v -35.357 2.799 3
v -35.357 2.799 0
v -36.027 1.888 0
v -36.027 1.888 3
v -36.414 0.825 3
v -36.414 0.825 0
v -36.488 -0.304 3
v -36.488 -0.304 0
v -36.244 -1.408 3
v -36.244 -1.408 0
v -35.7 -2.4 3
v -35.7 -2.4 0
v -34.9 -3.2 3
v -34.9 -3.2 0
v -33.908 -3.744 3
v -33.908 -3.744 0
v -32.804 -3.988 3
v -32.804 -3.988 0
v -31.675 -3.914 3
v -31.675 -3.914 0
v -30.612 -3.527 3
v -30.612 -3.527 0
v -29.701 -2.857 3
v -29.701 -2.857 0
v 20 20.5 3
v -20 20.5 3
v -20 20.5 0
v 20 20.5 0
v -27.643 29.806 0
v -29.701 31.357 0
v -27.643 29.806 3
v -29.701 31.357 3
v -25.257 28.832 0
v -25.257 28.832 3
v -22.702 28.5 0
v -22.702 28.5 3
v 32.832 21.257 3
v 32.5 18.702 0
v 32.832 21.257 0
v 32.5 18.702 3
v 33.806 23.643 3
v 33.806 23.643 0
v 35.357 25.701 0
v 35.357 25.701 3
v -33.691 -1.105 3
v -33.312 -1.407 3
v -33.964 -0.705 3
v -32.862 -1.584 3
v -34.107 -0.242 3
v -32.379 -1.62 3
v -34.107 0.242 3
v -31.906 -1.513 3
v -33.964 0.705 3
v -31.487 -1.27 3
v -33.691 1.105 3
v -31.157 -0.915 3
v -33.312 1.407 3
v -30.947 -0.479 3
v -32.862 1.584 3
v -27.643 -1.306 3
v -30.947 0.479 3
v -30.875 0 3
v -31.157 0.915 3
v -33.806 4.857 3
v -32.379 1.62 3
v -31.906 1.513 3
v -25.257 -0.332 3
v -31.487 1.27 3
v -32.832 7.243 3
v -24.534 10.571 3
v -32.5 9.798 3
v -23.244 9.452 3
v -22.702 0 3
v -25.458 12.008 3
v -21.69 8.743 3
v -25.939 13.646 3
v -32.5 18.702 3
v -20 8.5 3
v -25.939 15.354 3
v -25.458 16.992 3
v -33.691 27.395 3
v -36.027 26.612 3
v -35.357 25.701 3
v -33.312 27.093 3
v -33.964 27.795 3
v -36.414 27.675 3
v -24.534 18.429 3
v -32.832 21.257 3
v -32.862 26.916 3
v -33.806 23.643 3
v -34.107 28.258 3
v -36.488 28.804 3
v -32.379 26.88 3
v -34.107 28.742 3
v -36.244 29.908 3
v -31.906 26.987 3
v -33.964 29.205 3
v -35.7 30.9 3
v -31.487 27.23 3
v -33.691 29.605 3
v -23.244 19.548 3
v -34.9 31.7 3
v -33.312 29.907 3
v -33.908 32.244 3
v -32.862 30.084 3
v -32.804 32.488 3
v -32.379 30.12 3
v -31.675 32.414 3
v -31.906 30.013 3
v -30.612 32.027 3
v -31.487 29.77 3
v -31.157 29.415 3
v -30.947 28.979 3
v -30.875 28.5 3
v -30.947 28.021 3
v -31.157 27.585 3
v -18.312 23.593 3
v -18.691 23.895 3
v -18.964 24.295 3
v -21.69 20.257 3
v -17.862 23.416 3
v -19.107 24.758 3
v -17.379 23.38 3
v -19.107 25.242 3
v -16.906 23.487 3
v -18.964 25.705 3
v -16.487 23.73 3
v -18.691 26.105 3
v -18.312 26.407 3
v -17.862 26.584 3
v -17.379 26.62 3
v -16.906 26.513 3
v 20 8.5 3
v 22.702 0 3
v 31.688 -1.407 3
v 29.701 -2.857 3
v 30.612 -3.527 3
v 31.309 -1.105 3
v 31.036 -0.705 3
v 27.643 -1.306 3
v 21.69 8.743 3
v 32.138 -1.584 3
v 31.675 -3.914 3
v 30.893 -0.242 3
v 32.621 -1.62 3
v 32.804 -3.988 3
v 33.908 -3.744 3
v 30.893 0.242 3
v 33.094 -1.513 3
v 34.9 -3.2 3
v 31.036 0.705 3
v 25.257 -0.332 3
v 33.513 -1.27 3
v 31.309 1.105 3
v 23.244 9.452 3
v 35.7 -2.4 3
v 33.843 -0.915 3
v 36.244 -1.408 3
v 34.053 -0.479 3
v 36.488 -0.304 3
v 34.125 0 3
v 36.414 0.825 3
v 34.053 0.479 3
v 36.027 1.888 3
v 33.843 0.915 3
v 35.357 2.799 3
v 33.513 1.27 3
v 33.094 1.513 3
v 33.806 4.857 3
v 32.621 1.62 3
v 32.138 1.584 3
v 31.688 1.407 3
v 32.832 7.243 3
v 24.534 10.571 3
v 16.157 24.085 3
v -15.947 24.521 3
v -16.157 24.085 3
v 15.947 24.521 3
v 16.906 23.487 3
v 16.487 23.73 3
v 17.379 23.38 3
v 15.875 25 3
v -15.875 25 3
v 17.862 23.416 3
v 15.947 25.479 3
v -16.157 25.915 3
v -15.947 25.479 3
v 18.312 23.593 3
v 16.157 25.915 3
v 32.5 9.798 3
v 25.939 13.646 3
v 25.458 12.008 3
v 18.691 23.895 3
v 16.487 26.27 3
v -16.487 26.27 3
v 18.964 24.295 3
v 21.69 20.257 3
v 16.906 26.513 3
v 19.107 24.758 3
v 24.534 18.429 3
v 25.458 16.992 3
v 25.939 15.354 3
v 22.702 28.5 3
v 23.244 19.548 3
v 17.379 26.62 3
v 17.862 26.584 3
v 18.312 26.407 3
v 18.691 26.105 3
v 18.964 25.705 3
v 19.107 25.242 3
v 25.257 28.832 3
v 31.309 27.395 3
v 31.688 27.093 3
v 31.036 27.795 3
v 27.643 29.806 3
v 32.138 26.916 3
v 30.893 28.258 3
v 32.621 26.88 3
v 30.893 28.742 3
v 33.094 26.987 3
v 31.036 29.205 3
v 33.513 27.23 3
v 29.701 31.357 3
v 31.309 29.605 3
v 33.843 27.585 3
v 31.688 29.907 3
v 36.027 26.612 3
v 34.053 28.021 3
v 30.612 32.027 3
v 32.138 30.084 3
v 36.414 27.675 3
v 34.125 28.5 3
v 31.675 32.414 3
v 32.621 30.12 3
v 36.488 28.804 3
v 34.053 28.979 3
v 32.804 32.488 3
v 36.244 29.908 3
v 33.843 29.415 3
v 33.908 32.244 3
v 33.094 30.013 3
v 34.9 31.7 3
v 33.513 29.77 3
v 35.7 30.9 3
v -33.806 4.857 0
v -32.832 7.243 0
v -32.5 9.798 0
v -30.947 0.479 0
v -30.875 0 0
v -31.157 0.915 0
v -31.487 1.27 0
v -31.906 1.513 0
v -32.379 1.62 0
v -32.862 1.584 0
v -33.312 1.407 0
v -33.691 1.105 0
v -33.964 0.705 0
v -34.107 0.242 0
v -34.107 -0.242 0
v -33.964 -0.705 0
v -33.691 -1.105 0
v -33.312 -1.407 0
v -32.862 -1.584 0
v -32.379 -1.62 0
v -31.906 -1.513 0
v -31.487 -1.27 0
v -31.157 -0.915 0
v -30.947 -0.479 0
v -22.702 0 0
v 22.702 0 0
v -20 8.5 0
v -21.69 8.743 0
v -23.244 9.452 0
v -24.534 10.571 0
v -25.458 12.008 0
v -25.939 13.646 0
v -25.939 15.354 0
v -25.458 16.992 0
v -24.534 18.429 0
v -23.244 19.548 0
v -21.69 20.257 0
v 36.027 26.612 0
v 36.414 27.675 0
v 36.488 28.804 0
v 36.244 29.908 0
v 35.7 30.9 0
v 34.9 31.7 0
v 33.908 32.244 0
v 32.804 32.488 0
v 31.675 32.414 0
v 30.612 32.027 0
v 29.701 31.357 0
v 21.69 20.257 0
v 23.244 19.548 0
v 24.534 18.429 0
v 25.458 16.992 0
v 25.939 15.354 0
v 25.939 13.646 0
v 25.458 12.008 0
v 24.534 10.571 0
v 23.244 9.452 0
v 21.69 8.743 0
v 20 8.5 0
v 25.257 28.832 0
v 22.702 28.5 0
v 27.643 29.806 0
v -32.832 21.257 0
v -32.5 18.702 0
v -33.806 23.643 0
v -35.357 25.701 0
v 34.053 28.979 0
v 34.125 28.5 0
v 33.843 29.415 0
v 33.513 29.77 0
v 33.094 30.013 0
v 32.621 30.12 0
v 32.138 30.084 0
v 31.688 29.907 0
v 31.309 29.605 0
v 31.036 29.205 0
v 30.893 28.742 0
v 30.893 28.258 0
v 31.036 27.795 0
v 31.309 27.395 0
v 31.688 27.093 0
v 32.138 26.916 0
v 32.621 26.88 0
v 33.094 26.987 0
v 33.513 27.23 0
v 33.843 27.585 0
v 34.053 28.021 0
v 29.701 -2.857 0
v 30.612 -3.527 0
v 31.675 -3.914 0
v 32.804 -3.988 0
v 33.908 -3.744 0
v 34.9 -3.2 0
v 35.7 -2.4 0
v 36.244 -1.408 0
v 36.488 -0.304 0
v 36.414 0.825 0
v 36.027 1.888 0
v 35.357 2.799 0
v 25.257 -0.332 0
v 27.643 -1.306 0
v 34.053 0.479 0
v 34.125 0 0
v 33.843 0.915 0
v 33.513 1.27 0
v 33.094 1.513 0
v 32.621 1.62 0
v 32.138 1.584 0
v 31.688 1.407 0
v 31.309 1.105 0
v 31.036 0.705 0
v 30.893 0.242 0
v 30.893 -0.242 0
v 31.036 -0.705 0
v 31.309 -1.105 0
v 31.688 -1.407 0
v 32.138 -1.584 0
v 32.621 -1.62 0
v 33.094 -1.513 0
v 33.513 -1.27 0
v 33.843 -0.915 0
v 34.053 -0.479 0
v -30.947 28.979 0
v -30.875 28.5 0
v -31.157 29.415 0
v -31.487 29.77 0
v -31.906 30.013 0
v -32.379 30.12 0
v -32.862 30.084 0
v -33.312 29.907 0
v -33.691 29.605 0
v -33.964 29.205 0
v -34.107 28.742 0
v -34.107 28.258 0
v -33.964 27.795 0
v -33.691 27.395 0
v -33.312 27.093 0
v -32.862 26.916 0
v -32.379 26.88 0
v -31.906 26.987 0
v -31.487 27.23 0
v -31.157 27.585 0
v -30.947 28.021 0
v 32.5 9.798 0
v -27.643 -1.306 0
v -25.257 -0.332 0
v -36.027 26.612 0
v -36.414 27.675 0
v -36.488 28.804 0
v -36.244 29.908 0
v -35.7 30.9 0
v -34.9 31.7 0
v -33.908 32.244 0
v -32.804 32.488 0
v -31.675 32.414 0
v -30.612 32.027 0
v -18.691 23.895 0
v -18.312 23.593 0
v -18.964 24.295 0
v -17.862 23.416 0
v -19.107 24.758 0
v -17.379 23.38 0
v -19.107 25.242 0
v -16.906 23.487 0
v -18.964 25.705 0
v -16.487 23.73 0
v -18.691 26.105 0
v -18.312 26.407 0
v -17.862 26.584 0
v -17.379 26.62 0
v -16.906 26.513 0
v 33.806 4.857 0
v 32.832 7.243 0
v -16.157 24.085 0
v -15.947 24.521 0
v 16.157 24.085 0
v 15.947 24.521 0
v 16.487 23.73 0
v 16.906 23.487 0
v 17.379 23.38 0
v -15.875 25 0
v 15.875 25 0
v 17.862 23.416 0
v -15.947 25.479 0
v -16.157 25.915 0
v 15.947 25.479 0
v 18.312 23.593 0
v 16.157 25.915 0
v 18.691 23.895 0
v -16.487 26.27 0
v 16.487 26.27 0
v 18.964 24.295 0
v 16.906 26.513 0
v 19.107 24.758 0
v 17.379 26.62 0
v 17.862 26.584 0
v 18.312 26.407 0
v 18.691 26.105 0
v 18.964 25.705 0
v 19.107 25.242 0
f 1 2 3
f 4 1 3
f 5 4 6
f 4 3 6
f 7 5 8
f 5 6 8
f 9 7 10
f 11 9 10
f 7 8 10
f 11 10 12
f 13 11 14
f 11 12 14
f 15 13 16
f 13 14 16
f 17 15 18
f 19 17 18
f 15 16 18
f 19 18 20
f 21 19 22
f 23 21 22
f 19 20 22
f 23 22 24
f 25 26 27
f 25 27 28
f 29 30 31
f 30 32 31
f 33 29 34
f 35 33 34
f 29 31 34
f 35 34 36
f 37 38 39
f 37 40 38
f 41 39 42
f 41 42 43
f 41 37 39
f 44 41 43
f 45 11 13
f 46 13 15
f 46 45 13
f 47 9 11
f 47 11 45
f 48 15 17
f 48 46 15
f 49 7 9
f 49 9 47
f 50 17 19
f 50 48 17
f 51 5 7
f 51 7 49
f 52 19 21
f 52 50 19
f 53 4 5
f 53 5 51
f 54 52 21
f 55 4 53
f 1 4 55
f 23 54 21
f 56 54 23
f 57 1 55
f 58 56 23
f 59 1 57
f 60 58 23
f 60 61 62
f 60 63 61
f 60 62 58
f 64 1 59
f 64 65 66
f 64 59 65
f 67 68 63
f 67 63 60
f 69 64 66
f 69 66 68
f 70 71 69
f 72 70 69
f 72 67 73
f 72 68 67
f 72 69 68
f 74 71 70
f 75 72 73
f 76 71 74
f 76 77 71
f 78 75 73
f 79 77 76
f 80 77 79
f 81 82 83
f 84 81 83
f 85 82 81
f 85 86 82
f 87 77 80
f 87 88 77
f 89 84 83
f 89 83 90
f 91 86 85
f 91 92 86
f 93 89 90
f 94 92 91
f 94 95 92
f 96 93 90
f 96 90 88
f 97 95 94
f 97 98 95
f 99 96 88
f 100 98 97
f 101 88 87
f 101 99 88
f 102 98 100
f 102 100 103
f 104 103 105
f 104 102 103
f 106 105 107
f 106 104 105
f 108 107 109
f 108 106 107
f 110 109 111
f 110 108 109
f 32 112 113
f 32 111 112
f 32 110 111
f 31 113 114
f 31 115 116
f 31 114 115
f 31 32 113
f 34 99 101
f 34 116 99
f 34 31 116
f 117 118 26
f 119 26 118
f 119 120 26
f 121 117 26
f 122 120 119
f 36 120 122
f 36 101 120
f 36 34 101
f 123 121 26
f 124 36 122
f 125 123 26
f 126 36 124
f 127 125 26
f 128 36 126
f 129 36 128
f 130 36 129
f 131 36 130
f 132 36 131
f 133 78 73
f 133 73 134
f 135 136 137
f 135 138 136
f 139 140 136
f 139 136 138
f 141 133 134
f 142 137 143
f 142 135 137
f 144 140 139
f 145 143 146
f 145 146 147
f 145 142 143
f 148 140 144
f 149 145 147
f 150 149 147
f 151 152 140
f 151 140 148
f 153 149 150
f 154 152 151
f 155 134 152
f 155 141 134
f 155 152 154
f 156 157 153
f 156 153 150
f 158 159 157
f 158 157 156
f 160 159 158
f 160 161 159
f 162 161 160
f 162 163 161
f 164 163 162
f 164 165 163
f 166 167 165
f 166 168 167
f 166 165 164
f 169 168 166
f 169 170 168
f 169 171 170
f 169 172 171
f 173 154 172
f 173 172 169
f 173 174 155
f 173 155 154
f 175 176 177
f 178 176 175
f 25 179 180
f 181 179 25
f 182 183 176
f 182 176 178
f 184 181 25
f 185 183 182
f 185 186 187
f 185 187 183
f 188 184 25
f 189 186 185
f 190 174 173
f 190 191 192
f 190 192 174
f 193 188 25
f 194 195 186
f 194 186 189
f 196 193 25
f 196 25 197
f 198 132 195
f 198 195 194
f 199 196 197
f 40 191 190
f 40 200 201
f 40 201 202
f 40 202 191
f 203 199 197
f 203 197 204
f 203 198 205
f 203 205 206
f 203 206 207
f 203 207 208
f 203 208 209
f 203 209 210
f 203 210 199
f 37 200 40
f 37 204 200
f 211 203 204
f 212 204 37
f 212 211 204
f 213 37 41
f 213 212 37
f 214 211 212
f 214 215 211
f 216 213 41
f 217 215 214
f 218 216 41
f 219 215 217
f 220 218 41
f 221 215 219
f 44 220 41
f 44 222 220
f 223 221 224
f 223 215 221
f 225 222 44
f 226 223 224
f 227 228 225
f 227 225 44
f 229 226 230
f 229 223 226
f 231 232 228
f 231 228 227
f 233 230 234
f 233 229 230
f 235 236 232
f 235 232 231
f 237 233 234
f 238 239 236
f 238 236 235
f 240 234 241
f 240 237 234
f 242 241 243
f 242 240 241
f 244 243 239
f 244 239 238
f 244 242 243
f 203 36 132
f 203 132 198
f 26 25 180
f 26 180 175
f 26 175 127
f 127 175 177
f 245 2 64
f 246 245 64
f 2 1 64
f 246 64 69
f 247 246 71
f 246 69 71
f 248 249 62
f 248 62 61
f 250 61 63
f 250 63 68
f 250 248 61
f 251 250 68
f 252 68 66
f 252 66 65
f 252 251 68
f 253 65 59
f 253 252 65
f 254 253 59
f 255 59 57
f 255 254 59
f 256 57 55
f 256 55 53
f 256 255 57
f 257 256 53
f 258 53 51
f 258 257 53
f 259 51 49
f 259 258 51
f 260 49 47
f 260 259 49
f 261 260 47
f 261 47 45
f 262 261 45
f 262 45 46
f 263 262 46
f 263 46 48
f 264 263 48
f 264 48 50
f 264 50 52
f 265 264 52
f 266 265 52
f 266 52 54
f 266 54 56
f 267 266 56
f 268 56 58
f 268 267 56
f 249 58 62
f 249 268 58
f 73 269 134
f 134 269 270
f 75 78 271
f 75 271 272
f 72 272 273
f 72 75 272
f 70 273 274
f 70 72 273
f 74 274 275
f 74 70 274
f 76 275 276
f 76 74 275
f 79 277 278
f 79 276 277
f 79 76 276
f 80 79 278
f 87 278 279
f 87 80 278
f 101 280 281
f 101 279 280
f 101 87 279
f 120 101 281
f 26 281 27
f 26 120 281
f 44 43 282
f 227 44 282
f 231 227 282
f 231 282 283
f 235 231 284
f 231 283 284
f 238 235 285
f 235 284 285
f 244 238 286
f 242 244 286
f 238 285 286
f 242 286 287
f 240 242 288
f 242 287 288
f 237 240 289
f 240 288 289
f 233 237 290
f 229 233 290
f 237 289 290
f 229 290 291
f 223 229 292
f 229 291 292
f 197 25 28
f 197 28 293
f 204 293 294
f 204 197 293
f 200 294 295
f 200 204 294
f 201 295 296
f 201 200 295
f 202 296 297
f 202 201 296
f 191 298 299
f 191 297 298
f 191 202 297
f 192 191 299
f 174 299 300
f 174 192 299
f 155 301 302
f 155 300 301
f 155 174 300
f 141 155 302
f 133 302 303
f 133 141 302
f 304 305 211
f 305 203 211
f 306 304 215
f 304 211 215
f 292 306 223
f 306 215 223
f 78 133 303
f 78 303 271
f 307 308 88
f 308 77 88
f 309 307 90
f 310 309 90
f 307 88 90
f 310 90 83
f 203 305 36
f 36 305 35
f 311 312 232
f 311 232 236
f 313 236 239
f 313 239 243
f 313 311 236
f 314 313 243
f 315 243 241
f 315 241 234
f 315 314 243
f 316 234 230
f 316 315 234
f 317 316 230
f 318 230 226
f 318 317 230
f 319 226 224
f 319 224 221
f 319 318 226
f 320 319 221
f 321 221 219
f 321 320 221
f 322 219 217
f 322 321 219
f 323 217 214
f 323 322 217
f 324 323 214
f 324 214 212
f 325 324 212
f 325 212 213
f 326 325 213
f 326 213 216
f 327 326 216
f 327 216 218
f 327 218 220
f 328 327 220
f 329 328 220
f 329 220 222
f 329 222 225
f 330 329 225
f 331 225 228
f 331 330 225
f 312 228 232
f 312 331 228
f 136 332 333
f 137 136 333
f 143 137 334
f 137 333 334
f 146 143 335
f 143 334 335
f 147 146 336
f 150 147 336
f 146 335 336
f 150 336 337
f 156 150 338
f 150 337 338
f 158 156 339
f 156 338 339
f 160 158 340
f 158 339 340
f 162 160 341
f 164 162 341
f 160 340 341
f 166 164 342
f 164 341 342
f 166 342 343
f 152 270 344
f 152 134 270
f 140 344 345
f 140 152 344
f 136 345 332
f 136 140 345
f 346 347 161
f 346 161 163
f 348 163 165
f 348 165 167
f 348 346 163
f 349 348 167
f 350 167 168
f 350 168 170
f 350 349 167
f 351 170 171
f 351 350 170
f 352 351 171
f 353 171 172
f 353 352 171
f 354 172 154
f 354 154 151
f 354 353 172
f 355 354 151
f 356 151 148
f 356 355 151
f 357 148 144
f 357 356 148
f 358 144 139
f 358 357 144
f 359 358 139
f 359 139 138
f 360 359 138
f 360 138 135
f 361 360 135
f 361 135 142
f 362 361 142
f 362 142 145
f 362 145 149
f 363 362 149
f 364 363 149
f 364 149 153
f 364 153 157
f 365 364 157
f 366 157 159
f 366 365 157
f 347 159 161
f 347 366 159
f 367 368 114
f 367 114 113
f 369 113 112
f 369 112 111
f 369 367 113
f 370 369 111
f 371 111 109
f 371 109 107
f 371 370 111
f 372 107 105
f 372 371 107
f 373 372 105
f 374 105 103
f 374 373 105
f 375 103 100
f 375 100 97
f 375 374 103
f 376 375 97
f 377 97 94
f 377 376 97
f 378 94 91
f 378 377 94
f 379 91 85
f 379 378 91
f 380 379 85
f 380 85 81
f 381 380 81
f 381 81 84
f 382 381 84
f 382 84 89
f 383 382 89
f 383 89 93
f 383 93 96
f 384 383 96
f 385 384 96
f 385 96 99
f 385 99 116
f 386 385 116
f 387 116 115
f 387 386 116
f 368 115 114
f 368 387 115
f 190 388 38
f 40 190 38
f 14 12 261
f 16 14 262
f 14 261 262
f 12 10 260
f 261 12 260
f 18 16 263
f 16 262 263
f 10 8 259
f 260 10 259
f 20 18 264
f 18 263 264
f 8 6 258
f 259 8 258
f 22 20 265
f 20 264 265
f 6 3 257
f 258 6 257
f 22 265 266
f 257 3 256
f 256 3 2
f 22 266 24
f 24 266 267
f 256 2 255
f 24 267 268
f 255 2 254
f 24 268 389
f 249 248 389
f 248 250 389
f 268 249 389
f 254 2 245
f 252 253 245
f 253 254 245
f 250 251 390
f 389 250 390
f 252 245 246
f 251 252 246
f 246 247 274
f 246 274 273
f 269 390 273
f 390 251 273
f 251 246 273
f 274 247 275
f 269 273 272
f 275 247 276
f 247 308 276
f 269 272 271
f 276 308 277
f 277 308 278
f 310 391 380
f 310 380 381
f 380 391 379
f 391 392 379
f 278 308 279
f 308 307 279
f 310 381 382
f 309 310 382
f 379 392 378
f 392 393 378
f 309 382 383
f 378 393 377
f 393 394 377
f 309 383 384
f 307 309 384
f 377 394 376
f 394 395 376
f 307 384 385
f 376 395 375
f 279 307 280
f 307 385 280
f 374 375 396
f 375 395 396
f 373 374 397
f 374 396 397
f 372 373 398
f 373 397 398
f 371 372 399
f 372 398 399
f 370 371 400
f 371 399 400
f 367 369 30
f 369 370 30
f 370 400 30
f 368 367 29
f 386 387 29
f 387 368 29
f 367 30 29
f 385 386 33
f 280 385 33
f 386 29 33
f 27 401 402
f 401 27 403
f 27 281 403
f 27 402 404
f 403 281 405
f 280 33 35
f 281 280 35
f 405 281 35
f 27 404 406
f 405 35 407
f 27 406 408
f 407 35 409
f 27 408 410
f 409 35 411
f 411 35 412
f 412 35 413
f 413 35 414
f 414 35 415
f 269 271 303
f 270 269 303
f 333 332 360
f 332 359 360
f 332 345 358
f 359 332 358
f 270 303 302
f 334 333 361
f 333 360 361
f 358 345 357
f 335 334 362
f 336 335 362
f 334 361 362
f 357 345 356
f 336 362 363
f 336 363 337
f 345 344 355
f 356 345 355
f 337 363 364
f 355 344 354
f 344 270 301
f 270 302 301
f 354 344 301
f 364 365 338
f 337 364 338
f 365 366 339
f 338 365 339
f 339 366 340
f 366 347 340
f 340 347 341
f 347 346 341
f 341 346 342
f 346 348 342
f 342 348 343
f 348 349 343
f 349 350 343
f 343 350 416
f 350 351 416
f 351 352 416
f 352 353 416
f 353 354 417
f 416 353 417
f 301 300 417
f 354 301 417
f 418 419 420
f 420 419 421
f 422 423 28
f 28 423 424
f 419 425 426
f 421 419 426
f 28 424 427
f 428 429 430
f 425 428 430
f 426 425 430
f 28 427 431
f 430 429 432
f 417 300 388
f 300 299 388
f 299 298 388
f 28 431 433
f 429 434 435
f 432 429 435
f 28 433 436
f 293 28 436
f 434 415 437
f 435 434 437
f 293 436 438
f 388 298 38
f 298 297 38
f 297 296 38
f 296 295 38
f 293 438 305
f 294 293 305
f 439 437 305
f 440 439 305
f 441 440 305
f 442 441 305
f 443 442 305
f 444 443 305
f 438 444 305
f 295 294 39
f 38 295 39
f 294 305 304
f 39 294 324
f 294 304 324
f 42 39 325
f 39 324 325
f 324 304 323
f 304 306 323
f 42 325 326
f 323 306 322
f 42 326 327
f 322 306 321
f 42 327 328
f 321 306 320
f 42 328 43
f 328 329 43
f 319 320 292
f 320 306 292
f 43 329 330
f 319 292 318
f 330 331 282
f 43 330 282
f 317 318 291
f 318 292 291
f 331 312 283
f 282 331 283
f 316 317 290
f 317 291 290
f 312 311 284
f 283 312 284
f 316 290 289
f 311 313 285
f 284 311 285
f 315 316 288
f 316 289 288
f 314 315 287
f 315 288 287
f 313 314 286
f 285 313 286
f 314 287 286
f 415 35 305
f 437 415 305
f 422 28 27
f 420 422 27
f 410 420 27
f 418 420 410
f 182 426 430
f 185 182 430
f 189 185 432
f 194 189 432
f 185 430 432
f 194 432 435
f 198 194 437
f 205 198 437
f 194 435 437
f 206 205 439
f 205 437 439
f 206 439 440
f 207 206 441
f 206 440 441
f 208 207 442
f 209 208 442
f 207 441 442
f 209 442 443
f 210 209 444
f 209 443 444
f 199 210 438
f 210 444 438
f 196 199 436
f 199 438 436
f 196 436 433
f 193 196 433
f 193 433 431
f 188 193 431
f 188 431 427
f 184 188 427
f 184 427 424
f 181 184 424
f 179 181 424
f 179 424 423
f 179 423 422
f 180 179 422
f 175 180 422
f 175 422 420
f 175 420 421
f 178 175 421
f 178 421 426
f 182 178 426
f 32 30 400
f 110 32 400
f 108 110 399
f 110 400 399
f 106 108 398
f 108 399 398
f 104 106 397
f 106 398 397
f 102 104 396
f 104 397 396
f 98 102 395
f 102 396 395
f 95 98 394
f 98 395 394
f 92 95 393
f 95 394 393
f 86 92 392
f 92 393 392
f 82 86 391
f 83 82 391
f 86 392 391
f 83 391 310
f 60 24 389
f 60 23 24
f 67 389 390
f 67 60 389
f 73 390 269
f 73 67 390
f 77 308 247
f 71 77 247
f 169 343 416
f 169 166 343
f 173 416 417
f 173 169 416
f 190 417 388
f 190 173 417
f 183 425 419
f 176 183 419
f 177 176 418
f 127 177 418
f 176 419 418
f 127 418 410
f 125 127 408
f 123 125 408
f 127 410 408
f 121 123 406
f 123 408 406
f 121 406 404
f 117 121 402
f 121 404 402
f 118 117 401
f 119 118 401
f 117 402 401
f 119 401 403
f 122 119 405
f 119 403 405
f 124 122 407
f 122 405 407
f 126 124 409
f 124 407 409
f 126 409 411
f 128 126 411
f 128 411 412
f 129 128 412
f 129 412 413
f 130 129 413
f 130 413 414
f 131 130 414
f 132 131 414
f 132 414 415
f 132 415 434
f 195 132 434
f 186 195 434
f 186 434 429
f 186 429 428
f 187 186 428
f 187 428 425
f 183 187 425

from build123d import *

# Parameters (mm, degrees)
SKETCH_1_R          = 1.625
EXTRUDE_1_DEPTH     = 3
FILLET_1_R          = 10
SKETCH_3_R          = 1.625
CUT_EXTRUDE_1_DEPTH = 10
CUT_EXTRUDE_4_DEPTH = 10


with BuildPart() as part:
    # Эскиз1 → Бобышка-Вытянуть1 (new body)
    with BuildSketch(Plane.XY):
        with BuildLine():
            ThreePointArc((-32.5, 4), (-35.328427125, -2.828427125), (-28.5, 0))
            Line((-28.5, 0), (28.5, 0))
            ThreePointArc((28.5, 0), (35.328427125, -2.828427125), (32.5, 4))
            Line((32.5, 4), (32.5, 24.5))
            ThreePointArc((32.5, 24.5), (35.328427125, 31.328427125), (28.5, 28.5))
            Line((28.5, 28.5), (-28.5, 28.5))
            ThreePointArc((-28.5, 28.5), (-35.328427125, 31.328427125), (-32.5, 24.5))
            Line((-32.5, 24.5), (-32.5, 4))
        make_face()
        with Locations((-32.5, 0)):
            Circle(SKETCH_1_R, mode=Mode.SUBTRACT)
        with Locations((32.5, 28.5)):
            Circle(SKETCH_1_R, mode=Mode.SUBTRACT)
        with Locations((-32.5, 28.5)):
            Circle(SKETCH_1_R, mode=Mode.SUBTRACT)
        with Locations((32.5, 0)):
            Circle(SKETCH_1_R, mode=Mode.SUBTRACT)
    extrude(amount=EXTRUDE_1_DEPTH)

    # Скругление1
    fillet_1_edges = [part.edges().sort_by_distance(p)[0] for p in [
        (28.5, 0, 1.5),
        (-28.5, 0, 1.5),
        (-32.5, 4, 1.5),
        (-32.5, 24.5, 1.5),
        (-28.5, 28.5, 1.5),
        (28.5, 28.5, 1.5),
        (32.5, 24.5, 1.5),
        (32.5, 4, 1.5),
    ]]
    fillet(fillet_1_edges, radius=FILLET_1_R)

    # Эскиз3 → Вырез-Вытянуть1 (cut)
    with BuildSketch(Plane(origin=(0, 0, 0), x_dir=(-1, 0, 0), z_dir=(0, 0, -1))):
        with Locations((-17.5, 25)):
            Circle(SKETCH_3_R)
        with Locations(Location((17.5, 25, 0), (0, 0, 180))):
            Circle(SKETCH_3_R)
    extrude(amount=-CUT_EXTRUDE_1_DEPTH, mode=Mode.SUBTRACT)

    # Эскиз7 → Вырез-Вытянуть4 (cut)
    with BuildSketch(Plane.XY.offset(3)):
        with BuildLine():
            Line((-20, 20.5), (20, 20.5))
            ThreePointArc((20, 20.5), (26, 14.5), (20, 8.5))
            Line((20, 8.5), (-20, 8.5))
            ThreePointArc((-20, 8.5), (-26, 14.5), (-20, 20.5))
        make_face()
    extrude(amount=-CUT_EXTRUDE_4_DEPTH, mode=Mode.SUBTRACT)


solid = part.part
